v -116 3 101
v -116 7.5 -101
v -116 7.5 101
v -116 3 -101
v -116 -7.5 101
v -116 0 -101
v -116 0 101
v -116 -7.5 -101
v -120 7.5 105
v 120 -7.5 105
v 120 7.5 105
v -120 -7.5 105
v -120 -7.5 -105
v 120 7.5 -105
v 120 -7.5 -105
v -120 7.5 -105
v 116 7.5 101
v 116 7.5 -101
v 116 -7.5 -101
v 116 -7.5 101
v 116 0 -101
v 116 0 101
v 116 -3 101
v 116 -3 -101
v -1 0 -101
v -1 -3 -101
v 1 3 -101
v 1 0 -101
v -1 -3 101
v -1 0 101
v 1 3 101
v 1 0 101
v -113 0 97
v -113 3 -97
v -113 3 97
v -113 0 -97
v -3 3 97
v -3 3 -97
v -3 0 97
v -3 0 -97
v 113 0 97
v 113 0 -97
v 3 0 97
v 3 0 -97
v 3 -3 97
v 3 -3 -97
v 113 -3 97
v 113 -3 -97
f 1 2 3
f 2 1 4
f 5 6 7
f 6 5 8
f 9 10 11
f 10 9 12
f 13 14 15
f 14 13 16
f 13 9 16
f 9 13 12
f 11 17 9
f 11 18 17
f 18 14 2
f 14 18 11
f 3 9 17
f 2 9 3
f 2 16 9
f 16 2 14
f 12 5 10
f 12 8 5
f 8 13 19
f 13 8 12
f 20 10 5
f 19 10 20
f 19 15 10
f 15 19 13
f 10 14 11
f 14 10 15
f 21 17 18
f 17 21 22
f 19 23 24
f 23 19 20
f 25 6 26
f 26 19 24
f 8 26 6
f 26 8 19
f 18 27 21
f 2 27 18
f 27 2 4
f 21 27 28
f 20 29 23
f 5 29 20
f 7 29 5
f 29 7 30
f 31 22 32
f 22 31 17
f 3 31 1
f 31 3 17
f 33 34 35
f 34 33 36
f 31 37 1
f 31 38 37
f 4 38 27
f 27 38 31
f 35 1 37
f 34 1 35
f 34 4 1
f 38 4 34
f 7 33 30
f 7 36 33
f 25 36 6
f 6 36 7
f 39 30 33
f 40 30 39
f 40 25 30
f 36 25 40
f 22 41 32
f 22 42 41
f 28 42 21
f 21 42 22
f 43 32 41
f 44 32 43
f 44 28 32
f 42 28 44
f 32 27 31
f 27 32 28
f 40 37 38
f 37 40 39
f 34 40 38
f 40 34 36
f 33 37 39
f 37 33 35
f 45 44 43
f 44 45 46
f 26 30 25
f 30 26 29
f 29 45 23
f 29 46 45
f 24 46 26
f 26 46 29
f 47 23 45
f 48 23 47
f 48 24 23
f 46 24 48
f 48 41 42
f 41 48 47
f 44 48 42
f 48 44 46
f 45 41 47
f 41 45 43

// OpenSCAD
module frontdoor(width=240, height=210, wall_thickness=15) 
{
    door_thickness = 4.0;
    profile_width = 4;
    profile_depth = 3.0;
    frame_profile_width = 4;
    frame_profile_depth = wall_thickness;
    
    //translate([0, 
    //    -(frame_profile_depth-door_thickness)/2, height/2])
    union() {
             
        /* Outer frame fixed to concrete wall. */
        color([0.2,0.0,0.1])
        genericdoorframe(width, height, frame_profile_width, frame_profile_depth);
    
        /* Calculate opning size. */
        open_w = width - 2 * frame_profile_width;
        open_h = height - 2 * frame_profile_width;
        half_open_w = (open_w + frame_profile_width)/2; 
        
        /* Left window glass frame. */
        translate([-(open_w)/4, profile_depth/2, 0]) 
        color([0.5,0.3,0.3])
        genericdoorframe(half_open_w, open_h, profile_width, profile_depth);
    
        /* Right window glass frame. */
        translate([(open_w)/4, -profile_depth/2, 0]) 
        color([0.5,0.3,0.3])
        genericdoorframe(half_open_w, open_h, profile_width, profile_depth);
    }
}

module genericdoorframe(width=70, height=110, profile_width = 5, profile_depth = 8) 
{
    translate([-(width - profile_width)/2, 0, 0]) 
    cube([profile_width,profile_depth, height], center=true);
    
    translate([(width - profile_width)/2, 0, 0]) 
    cube([profile_width,profile_depth, height], center=true);

    translate([0, 0, -(height - profile_width)/2]) 
    cube([width, profile_depth, profile_width], center=true);

    translate([0, 0, (height - profile_width)/2]) 
    cube([width, profile_depth, profile_width], center=true);
}    

/* For testing */
frontdoor();
